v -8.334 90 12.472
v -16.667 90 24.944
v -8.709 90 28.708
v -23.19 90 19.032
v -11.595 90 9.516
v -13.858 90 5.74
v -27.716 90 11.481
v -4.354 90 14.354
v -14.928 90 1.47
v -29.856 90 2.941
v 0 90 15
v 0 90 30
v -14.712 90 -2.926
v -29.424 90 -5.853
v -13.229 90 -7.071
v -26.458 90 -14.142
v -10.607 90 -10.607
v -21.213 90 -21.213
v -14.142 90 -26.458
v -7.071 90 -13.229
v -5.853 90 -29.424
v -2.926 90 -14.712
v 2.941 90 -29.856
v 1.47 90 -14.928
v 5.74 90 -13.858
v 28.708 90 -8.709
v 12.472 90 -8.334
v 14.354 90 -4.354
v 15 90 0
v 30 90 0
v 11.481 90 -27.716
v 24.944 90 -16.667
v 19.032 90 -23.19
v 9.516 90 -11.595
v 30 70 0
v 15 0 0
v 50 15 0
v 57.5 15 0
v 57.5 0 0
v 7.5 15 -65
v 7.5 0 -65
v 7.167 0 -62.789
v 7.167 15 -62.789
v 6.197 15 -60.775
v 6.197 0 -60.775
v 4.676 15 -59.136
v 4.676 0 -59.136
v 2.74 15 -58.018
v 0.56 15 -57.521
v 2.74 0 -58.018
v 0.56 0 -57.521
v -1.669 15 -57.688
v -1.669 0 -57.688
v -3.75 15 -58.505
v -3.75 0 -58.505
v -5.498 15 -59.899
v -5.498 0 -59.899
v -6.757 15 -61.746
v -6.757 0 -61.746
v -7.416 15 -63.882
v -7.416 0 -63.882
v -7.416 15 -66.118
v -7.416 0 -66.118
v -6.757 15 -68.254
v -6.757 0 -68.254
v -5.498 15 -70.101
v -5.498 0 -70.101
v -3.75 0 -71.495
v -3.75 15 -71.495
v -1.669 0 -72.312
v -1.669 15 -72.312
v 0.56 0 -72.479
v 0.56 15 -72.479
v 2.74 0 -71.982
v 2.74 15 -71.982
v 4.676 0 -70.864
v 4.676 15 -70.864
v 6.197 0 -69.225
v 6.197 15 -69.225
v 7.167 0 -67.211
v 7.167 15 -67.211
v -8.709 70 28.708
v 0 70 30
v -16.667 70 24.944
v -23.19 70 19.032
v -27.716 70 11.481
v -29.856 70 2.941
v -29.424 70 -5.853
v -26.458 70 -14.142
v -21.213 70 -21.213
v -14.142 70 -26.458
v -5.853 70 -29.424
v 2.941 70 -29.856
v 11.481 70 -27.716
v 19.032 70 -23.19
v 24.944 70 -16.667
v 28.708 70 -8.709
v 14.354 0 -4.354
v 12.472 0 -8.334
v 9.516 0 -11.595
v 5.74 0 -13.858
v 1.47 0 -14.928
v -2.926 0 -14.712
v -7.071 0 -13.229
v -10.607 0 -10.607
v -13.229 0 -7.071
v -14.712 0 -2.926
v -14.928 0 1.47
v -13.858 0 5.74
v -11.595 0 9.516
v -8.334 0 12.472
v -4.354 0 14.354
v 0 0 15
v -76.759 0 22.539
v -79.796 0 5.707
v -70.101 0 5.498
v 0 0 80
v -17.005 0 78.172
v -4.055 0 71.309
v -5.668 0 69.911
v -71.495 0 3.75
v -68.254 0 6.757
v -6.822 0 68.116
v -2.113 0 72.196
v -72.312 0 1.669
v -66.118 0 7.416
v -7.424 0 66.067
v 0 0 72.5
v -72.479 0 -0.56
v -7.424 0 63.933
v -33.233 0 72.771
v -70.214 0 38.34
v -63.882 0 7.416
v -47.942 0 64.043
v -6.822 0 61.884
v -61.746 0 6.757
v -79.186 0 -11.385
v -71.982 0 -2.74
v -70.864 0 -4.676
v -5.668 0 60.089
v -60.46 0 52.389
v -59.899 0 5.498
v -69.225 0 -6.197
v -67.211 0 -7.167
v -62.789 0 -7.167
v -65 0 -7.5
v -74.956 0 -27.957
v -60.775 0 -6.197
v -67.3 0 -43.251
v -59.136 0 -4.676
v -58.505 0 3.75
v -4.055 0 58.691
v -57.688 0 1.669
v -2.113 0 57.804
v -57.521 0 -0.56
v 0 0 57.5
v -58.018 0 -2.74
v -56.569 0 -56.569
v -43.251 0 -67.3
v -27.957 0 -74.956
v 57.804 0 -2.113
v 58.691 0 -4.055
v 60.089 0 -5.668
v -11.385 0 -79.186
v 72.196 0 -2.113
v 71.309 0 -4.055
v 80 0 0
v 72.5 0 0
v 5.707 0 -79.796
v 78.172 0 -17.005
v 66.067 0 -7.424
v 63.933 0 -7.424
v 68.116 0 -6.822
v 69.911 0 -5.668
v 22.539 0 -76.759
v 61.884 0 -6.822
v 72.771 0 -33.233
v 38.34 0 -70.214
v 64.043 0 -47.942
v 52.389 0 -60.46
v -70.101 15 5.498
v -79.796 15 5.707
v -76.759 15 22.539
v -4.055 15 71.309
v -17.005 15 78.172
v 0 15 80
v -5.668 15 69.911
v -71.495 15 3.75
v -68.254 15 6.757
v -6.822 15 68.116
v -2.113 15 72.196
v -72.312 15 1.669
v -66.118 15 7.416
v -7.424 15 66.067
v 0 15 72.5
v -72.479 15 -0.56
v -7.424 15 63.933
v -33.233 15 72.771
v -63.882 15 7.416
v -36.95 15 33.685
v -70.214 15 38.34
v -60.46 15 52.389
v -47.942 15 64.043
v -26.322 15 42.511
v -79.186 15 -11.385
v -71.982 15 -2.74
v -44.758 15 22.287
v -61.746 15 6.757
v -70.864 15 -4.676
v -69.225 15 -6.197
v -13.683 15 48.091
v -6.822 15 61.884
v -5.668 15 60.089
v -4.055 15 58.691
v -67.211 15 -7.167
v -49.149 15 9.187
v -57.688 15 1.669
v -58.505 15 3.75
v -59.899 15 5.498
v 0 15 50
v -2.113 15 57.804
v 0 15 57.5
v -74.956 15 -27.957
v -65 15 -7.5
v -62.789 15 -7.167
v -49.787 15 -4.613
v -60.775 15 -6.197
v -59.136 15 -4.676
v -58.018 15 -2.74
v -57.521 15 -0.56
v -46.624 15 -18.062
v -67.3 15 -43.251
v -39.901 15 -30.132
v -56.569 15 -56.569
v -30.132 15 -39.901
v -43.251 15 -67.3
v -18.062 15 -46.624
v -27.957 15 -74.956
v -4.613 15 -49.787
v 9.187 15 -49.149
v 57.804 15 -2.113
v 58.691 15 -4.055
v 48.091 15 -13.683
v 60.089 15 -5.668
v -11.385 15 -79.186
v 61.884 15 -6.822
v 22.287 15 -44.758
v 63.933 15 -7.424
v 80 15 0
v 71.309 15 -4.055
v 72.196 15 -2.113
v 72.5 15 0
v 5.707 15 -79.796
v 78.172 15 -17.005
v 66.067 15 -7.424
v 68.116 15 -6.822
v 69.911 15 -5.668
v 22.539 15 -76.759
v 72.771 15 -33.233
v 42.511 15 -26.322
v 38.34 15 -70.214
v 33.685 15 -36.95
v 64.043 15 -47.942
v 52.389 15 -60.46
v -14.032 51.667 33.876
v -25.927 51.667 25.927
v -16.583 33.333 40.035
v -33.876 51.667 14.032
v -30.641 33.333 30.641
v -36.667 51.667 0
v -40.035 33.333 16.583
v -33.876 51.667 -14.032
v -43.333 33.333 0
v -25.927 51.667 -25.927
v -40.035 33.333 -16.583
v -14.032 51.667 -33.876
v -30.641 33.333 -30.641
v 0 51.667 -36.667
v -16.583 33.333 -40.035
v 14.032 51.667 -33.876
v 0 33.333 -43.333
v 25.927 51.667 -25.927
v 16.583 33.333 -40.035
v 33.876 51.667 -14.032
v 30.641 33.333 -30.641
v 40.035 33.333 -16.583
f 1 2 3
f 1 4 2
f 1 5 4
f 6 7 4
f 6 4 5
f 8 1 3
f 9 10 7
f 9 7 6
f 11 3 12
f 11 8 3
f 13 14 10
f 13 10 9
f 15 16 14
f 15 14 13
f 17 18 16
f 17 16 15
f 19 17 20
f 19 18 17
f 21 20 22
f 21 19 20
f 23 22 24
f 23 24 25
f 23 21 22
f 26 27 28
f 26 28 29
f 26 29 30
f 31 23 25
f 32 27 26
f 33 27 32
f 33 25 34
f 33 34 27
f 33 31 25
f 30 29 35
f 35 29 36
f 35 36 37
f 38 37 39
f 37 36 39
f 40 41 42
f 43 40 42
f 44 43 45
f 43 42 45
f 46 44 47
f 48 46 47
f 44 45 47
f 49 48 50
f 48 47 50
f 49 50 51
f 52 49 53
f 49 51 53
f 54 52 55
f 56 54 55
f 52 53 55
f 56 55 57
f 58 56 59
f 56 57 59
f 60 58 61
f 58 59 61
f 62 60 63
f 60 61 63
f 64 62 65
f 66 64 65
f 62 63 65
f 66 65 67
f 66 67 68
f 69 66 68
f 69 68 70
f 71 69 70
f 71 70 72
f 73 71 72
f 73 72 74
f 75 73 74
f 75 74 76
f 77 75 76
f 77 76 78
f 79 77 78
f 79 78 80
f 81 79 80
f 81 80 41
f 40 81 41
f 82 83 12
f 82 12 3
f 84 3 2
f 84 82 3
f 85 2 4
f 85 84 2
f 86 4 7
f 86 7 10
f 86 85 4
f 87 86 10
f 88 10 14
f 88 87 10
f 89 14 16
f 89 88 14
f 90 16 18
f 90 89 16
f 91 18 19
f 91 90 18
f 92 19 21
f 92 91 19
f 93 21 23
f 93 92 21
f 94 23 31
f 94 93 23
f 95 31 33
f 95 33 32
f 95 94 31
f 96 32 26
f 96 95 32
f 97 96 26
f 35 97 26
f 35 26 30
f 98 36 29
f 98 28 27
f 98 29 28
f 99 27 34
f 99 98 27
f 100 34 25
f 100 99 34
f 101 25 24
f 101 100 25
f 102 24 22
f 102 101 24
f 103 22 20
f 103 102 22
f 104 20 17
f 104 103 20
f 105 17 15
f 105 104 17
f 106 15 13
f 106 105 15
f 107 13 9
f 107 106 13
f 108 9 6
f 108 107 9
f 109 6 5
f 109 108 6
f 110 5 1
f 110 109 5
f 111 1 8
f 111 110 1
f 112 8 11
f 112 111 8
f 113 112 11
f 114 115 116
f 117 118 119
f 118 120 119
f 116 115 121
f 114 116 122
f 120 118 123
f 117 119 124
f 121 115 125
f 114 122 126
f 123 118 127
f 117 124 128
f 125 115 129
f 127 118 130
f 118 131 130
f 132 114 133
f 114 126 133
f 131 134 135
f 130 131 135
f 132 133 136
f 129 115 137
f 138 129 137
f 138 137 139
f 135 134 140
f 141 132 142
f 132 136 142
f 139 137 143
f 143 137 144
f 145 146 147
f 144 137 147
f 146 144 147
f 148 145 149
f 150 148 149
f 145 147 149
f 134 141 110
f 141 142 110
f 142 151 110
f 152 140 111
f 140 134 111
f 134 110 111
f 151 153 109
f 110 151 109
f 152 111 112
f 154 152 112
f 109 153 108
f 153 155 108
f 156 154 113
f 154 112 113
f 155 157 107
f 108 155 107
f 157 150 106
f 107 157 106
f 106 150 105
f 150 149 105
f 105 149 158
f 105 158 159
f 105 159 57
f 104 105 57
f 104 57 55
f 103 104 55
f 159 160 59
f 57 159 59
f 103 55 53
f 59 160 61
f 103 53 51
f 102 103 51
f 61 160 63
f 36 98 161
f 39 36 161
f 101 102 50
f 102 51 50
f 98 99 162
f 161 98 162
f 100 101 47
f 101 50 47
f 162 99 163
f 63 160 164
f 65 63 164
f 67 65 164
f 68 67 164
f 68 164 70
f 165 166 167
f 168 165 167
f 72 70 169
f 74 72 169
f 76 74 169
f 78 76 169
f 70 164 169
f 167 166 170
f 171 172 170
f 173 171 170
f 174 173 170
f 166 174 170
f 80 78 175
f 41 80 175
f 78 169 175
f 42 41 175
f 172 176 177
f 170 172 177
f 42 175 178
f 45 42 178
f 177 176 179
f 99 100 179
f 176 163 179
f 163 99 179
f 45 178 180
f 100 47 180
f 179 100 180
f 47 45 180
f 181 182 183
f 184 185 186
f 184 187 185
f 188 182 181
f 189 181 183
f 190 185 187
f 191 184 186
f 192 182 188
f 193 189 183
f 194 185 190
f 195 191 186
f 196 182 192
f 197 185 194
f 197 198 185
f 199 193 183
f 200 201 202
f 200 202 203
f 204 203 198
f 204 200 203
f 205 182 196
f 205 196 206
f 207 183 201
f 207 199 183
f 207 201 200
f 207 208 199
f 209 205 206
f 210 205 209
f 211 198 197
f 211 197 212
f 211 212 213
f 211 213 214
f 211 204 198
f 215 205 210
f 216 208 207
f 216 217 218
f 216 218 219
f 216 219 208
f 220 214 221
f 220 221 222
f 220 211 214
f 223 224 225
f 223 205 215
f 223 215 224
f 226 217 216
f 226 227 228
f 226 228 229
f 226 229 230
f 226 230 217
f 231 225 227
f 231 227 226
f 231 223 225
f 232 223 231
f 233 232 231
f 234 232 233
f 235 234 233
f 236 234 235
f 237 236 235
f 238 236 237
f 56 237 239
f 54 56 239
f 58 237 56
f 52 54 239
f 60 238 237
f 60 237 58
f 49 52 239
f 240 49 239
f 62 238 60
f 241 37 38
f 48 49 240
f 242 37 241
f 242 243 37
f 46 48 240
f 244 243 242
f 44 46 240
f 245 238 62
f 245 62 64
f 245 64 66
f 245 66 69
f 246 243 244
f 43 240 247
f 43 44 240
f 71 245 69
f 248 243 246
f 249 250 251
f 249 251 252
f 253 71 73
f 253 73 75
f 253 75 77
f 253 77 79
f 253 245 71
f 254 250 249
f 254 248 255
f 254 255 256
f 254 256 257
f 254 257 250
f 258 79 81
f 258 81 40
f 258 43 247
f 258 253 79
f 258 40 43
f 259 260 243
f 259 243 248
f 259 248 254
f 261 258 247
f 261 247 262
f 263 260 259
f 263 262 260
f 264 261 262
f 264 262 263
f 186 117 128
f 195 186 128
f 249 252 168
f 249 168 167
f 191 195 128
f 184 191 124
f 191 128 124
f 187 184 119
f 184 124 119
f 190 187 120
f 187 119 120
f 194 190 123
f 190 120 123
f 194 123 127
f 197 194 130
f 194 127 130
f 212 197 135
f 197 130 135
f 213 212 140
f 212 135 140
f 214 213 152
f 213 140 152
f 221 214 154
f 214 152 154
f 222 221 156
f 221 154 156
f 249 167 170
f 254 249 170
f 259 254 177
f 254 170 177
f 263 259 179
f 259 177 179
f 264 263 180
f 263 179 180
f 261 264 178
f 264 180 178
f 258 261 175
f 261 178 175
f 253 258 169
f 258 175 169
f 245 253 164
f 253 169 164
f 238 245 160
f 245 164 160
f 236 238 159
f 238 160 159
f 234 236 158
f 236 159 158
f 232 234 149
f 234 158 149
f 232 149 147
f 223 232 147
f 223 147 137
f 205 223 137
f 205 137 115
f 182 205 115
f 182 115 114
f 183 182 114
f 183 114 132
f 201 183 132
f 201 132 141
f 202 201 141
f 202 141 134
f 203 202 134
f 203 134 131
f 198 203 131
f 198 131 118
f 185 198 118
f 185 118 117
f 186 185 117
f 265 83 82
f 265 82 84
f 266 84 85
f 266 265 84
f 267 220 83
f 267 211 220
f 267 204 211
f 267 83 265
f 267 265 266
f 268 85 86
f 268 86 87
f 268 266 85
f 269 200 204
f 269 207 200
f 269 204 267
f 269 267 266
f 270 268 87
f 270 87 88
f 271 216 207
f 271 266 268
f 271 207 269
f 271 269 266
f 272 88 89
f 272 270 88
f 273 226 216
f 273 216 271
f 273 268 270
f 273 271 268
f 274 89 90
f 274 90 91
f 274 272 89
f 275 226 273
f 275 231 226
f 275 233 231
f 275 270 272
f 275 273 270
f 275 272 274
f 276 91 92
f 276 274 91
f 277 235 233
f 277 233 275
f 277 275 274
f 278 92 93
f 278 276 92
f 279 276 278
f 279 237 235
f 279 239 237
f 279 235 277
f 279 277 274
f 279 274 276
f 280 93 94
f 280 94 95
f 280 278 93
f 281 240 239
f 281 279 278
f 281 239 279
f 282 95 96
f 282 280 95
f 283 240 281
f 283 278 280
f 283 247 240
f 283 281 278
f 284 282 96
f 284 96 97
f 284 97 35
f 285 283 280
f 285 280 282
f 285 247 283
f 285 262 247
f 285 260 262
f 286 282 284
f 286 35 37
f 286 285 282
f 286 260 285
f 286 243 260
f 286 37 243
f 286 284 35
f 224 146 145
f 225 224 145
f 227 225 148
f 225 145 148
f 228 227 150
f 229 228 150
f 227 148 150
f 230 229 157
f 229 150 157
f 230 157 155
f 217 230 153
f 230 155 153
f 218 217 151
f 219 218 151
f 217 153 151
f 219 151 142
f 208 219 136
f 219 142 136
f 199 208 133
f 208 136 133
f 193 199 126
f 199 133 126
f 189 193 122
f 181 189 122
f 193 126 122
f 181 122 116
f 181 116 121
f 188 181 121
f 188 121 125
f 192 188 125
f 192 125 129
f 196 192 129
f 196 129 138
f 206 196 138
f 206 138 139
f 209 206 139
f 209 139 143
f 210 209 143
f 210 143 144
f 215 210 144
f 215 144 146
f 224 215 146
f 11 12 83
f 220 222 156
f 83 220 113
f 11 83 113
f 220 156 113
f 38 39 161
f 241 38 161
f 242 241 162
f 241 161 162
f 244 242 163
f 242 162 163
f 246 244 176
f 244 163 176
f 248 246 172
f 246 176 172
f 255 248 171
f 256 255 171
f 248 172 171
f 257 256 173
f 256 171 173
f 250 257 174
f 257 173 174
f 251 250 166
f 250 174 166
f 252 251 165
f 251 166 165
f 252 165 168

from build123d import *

# Parameters (mm, degrees)
SKETCH1_R           = 80
BOSS_EXTRUDE1_DEPTH = 15
SKETCH2_R           = 50
BOSS_EXTRUDE2_DEPTH = 75
SKETCH3_R           = 15
CUT_EXTRUDE1_DEPTH  = 91
SKETCH5_R           = 7.5
CUT_EXTRUDE2_DEPTH  = 75
CIRPATTERN1_COUNT   = 4
CUT_EXTRUDE3_DEPTH  = 91


with BuildPart() as part:
    # Sketch1 → Boss-Extrude1 (new body)
    with BuildSketch(Plane(origin=(0, 0, 0), x_dir=(1, 0, 0), z_dir=(0, 1, 0))):
        Circle(SKETCH1_R)
    extrude(amount=BOSS_EXTRUDE1_DEPTH)

    # Sketch2 → Boss-Extrude2 (add)
    with BuildSketch(Plane(origin=(0, 15, 0), x_dir=(1, 0, 0), z_dir=(0, 1, 0))):
        Circle(SKETCH2_R)
    extrude(amount=BOSS_EXTRUDE2_DEPTH)

    # Sketch3 → Cut-Extrude1 (cut, through all)
    with BuildSketch(Plane(origin=(0, 0, 0), x_dir=(1, 0, 0), z_dir=(0, 1, 0))):
        Circle(SKETCH3_R)
    extrude(amount=CUT_EXTRUDE1_DEPTH, mode=Mode.SUBTRACT)

    # Sketch4 → Cut-Revolve1 (revolve, cut)
    with BuildSketch(Plane(origin=(0, 0, 0), x_dir=(0, 0, -1), z_dir=(1, 0, 0))):
        Polygon((-30, 90), (-30, 70), (-50, 15), (-50, 90), align=None)
    revolve(axis=Axis((0, 90, 0), (0, -1, 0)), mode=Mode.SUBTRACT)

    # Sketch5 → Cut-Extrude2 (cut)
    with BuildSketch(Plane.XZ):
        with Locations((0, -65)):
            Circle(SKETCH5_R)
    cut_extrude2 = extrude(amount=-CUT_EXTRUDE2_DEPTH, mode=Mode.SUBTRACT)

    # CirPattern1: Cut-Extrude2 ×4 about axis
    cirpattern1_axis = Axis((0, 0, 0), (0, 1, 0))
    for i in range(1, CIRPATTERN1_COUNT):
        add(cut_extrude2.rotate(cirpattern1_axis, i * 360 / CIRPATTERN1_COUNT), mode=Mode.SUBTRACT)

    # Sketch6 → Cut-Extrude3 (cut, through all)
    with BuildSketch(Plane.XZ):
        Polygon((0, 80), (0, 0), (80, 0), (80, 86.210661468), align=None)
    extrude(amount=-CUT_EXTRUDE3_DEPTH, mode=Mode.SUBTRACT)


solid = part.part
